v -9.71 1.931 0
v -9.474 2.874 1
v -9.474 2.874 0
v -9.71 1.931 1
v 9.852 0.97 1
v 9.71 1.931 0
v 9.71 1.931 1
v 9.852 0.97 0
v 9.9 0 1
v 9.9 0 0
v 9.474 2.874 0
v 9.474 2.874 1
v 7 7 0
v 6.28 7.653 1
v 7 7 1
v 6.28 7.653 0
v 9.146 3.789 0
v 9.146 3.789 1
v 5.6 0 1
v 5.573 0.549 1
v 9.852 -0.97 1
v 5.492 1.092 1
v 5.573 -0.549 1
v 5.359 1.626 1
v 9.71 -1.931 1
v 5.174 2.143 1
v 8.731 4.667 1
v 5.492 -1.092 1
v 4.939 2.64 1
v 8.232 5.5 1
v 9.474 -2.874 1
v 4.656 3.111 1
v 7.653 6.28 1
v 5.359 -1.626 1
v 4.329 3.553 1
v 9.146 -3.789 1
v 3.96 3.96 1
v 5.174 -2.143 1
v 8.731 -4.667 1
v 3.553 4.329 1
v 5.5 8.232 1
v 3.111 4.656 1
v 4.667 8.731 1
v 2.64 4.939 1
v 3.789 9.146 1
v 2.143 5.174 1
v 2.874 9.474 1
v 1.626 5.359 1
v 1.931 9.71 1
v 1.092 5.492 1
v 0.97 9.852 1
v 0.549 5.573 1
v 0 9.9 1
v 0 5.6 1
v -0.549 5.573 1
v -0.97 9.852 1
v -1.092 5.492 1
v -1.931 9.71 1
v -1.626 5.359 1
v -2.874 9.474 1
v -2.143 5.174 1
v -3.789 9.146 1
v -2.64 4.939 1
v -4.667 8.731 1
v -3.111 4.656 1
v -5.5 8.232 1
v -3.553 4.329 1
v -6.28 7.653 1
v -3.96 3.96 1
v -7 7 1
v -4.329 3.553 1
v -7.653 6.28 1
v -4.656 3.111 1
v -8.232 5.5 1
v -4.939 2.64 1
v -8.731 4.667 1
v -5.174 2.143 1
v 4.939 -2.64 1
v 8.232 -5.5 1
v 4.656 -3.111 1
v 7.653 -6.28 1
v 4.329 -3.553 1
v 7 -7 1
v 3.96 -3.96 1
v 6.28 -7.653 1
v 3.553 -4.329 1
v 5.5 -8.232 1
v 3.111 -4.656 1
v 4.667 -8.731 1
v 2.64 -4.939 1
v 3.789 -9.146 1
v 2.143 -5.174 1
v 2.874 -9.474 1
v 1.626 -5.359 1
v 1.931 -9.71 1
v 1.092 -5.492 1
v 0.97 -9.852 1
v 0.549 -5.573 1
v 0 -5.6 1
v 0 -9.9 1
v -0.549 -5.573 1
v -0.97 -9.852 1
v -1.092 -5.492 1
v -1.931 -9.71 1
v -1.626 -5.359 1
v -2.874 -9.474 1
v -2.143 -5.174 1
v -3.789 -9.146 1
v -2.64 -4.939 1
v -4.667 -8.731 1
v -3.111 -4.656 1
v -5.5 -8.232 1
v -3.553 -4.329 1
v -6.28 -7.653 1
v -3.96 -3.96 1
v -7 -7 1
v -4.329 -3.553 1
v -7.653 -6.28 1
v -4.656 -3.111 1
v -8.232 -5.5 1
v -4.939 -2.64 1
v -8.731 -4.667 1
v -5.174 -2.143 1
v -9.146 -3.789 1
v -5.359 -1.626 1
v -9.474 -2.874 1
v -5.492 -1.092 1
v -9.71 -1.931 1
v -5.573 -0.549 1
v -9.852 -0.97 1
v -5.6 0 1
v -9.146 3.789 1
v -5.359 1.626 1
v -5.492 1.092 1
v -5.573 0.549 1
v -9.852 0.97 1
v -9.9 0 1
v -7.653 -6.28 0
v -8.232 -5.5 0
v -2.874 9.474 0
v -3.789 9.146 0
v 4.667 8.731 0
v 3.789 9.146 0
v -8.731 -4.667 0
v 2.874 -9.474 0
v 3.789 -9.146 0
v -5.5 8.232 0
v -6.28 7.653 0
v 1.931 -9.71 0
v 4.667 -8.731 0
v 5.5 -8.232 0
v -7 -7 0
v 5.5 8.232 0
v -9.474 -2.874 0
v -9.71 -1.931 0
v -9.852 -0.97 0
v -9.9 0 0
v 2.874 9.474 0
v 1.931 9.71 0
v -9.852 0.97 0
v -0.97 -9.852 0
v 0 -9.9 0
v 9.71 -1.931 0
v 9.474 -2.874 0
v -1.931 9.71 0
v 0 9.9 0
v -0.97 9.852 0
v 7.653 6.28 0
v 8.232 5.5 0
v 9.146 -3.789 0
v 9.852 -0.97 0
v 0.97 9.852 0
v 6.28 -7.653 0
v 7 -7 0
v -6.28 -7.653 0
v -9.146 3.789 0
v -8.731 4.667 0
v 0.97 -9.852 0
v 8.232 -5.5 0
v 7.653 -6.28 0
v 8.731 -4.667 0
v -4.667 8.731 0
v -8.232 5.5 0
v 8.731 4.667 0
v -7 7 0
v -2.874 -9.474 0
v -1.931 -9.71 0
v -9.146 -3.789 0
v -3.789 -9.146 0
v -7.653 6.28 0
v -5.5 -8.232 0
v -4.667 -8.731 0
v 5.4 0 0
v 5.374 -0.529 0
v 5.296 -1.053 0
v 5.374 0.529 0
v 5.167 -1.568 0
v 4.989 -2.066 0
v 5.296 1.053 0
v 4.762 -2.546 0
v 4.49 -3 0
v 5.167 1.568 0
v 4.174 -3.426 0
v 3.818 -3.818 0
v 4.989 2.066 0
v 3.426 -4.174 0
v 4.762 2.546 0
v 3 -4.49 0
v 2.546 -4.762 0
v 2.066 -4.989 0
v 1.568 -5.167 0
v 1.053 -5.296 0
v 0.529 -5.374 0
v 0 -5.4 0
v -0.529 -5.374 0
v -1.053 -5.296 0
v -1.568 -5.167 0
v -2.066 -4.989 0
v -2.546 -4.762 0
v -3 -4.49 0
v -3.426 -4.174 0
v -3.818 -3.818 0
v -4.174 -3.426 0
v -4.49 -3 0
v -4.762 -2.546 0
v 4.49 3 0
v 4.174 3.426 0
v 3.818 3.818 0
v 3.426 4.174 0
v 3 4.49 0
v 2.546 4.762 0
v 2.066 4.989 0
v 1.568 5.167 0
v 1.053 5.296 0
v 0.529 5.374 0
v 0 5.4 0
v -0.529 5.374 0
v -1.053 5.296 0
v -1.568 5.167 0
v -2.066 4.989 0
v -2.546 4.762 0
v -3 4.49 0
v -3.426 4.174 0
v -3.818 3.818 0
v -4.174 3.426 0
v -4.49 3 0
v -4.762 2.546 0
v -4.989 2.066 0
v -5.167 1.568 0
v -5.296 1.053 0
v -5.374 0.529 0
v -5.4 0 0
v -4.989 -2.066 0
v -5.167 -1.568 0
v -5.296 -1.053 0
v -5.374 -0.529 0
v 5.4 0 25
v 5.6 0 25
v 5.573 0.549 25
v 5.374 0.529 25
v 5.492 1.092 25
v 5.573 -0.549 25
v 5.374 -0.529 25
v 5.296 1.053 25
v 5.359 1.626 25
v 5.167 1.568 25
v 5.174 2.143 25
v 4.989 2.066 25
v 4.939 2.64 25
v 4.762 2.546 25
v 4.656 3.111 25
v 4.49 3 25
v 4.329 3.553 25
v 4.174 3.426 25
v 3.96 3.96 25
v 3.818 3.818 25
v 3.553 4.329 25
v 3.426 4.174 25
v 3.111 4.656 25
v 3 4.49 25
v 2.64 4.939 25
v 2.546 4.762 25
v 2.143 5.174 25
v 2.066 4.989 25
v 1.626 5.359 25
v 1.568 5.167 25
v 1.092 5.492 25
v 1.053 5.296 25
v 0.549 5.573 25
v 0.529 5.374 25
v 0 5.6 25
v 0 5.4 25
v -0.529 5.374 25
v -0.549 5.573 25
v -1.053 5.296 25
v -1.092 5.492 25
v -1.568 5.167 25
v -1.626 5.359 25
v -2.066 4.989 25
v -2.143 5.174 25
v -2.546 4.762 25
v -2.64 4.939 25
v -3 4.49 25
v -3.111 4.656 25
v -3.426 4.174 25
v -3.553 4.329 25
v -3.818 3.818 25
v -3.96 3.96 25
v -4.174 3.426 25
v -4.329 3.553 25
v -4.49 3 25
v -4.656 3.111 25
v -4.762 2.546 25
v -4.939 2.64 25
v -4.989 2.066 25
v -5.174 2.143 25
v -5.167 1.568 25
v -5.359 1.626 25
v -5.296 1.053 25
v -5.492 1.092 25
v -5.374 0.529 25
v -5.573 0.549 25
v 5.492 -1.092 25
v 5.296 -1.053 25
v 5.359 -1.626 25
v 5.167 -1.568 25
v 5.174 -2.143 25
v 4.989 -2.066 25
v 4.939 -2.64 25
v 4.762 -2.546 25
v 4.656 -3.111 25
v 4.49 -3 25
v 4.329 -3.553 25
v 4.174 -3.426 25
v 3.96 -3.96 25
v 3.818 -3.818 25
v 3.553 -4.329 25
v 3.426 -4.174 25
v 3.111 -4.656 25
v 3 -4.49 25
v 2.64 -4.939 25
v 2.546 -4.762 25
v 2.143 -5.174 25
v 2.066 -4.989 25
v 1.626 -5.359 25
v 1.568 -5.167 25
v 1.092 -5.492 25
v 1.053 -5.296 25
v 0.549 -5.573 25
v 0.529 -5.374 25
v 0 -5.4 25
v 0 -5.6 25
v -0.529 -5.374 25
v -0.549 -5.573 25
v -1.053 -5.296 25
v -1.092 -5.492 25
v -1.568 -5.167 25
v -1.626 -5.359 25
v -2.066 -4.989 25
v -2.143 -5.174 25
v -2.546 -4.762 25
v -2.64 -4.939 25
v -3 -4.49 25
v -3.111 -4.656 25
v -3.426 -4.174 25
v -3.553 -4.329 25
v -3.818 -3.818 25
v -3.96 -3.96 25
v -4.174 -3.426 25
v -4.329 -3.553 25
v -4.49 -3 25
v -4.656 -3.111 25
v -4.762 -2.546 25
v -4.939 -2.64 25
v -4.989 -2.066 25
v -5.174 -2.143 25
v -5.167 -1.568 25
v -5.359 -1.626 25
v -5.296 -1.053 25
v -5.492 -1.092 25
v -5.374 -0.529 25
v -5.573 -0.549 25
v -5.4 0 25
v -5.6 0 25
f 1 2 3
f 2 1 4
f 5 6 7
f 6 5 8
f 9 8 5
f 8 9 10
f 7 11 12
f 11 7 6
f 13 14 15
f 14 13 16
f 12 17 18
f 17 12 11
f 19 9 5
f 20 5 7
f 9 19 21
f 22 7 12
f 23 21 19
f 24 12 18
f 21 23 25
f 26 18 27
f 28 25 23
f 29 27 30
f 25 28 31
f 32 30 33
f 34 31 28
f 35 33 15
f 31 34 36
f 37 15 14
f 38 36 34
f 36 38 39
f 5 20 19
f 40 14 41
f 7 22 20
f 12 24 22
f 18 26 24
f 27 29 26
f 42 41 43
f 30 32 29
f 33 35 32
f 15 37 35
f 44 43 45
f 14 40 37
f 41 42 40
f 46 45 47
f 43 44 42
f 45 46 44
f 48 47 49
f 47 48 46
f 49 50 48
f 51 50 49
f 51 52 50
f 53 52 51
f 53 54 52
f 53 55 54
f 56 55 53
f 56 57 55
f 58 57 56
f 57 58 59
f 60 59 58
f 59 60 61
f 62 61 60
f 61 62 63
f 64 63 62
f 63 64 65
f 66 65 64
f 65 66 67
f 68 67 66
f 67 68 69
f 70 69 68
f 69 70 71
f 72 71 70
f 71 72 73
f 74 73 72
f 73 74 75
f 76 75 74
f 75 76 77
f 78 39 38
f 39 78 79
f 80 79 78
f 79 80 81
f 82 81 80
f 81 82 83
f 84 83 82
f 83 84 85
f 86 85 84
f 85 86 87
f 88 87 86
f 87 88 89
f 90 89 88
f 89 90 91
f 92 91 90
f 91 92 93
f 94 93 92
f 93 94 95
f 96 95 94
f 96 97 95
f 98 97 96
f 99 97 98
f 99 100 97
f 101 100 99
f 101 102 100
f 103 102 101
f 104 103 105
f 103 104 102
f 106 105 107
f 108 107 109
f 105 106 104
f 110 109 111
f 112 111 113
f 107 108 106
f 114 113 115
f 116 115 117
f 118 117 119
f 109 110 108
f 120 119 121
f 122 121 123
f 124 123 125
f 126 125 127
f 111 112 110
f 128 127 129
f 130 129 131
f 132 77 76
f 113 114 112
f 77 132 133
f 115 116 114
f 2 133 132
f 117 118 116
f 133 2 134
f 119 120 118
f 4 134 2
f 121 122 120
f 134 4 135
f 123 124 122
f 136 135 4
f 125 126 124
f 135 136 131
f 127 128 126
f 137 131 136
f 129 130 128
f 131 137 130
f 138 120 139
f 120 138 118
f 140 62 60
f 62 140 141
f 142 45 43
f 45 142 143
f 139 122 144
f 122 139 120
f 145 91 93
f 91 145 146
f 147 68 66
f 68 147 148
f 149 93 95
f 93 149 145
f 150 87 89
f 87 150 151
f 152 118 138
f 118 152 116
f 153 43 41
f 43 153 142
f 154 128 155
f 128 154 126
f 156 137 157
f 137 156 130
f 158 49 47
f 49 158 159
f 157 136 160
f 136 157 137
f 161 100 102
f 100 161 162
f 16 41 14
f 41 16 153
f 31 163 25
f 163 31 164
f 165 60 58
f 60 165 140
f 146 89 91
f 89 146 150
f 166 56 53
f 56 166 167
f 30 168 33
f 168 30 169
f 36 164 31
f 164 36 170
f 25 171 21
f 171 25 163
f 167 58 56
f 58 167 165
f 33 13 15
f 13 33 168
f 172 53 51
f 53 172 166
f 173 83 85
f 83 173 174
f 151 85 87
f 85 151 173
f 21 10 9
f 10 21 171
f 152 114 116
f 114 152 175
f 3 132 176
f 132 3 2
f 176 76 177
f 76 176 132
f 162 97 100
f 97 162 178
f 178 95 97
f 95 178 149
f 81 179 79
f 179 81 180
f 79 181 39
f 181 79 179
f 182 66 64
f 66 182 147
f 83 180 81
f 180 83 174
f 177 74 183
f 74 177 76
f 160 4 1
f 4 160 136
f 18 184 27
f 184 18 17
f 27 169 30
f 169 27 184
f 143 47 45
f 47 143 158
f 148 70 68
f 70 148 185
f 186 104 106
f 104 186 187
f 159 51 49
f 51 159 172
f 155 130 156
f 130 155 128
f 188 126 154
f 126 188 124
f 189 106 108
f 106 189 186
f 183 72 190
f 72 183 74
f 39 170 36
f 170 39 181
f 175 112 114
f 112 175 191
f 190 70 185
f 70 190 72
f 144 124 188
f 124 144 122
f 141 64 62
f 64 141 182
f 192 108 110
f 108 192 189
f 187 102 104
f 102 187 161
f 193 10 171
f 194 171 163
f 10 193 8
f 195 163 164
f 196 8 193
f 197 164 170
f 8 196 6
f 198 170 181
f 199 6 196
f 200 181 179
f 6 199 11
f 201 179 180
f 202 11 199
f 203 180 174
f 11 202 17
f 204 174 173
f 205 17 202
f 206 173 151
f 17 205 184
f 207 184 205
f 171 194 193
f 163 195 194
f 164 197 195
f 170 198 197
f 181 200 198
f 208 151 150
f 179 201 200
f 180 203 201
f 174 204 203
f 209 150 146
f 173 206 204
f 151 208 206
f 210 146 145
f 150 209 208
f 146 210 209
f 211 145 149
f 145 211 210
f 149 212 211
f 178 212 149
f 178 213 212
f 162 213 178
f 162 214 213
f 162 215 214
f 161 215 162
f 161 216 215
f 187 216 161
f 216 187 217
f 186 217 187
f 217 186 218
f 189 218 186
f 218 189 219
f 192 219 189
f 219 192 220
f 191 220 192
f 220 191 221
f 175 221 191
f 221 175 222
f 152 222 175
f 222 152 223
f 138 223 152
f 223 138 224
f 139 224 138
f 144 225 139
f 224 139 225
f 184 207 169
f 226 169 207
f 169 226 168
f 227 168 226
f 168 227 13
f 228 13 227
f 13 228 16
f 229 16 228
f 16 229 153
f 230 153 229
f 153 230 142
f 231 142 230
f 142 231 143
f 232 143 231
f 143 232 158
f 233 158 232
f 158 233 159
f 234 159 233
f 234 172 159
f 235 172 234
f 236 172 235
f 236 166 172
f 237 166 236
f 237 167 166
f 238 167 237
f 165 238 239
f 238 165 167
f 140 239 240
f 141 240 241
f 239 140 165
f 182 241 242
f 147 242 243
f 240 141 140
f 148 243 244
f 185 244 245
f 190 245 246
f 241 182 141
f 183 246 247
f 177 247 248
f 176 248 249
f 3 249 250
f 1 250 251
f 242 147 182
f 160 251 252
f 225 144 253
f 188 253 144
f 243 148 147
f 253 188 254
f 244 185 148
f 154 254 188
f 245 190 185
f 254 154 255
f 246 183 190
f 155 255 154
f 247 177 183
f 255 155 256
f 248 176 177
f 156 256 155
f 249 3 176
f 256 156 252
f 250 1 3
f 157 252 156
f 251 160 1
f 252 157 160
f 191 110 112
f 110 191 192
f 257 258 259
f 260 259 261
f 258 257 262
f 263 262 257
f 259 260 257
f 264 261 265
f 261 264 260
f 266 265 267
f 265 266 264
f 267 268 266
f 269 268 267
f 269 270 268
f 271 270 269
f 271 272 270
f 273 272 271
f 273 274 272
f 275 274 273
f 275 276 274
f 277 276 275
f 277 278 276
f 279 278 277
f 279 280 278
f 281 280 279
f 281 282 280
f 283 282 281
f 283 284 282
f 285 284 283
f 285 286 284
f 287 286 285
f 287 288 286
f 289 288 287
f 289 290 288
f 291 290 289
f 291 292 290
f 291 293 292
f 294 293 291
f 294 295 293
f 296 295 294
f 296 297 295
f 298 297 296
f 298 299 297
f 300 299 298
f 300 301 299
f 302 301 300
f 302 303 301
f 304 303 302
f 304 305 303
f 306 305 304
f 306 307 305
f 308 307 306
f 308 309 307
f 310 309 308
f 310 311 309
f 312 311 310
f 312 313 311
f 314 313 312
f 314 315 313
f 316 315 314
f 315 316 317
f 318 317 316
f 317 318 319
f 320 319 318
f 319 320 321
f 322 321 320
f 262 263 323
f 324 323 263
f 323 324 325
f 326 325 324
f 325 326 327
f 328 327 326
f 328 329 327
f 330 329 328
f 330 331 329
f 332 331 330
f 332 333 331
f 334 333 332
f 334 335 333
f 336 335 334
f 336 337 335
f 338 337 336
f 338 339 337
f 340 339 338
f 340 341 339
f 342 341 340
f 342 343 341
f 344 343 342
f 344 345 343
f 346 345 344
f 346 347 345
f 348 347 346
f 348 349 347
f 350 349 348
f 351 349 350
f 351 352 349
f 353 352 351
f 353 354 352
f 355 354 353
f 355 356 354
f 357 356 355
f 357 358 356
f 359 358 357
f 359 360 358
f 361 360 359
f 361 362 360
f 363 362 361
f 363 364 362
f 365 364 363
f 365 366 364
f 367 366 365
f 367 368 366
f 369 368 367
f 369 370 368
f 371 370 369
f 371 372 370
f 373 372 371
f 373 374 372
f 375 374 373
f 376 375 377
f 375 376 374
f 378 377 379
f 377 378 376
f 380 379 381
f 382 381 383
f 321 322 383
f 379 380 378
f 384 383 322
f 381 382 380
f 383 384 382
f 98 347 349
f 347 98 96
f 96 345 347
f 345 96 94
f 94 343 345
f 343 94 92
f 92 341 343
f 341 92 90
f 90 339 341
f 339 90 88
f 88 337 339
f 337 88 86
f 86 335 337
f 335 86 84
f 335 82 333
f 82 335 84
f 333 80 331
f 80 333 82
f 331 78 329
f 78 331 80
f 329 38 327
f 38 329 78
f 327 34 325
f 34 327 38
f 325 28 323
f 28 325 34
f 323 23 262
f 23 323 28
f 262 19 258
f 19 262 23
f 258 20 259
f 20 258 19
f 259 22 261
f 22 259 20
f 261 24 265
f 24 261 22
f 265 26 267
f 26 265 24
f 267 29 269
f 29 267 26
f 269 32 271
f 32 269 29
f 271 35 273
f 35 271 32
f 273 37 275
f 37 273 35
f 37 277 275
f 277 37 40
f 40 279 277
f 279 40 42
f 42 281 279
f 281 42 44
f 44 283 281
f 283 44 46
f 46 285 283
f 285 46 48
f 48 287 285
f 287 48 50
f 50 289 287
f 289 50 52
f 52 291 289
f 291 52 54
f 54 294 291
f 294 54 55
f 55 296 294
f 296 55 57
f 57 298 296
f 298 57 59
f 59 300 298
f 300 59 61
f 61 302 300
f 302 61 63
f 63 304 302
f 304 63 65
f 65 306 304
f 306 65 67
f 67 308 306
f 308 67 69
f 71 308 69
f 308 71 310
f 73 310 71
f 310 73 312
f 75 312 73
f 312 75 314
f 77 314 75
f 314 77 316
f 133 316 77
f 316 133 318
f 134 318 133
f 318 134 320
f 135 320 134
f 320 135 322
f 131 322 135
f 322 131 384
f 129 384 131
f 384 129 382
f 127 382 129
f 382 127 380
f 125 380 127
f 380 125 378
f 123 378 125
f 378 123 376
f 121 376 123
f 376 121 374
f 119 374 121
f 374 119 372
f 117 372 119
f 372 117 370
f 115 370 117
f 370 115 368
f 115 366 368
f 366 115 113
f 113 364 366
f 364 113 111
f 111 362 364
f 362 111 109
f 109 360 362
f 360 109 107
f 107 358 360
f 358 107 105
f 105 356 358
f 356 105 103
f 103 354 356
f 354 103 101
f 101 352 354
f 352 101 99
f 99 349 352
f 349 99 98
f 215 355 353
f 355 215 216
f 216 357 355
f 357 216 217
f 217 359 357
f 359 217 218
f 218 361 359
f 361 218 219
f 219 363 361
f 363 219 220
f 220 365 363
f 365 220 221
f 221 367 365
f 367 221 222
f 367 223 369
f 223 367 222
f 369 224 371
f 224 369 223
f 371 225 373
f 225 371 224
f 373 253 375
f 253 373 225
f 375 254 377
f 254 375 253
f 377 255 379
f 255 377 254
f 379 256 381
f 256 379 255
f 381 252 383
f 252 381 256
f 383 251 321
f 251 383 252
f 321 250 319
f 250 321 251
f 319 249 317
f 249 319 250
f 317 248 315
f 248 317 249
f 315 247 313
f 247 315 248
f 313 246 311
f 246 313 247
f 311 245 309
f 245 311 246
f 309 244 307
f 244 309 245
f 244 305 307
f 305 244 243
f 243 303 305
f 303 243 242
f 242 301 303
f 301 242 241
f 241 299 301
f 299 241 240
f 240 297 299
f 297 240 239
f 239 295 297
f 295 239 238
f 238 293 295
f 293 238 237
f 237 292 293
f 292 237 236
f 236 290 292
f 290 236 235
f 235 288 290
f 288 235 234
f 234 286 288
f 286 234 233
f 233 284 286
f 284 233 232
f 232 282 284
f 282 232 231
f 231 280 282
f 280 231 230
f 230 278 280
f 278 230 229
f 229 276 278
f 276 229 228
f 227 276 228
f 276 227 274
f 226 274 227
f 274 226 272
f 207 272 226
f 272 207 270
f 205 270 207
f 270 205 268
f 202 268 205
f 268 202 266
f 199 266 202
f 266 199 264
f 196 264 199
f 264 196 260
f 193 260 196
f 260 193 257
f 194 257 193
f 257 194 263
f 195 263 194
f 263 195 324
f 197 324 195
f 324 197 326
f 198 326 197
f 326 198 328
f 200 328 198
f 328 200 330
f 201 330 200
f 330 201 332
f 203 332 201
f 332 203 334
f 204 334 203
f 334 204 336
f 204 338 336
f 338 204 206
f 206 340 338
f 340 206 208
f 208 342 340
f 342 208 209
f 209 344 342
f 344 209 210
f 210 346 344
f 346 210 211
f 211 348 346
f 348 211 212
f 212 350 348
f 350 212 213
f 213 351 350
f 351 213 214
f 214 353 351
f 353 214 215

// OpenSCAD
// file: mass-driver-parts.scad
$fn = 64;

nozzle_diameter = 0.4;

// outer diameter of the tube we're using.
tube_diameter = 10.0;

// Tolerances to add to an inner diameter so it fits over
tight_fit = 0.2;
loose_fit = 0.4;

epsilon = 0.01;

module tube(inner_diameter, outer_diameter, length){
    linear_extrude(length){
        difference(){
            circle(d = outer_diameter);
            circle(d = inner_diameter);
        }
    }
}

module loose_tube(length) {
    outer_diameter = tube_diameter + nozzle_diameter + loose_fit;
    
    tube(outer_diameter, outer_diameter + nozzle_diameter, length);
}

module base(inner_diameter, outer_diameter, thickness) {
    difference() {
        cylinder(d = outer_diameter, h = thickness);
        translate([0, 0, -epsilon])
        cylinder(d = inner_diameter, h = thickness + epsilon * 2);
    }
}
// main file
include <./mass-driver-parts.scad>

// Makes one half of a magnet coil winder.
// Print 2 for a full winder
// Use a calculator to find the length and height to use:
// https://www.accelinstruments.com/Magnetic/Magnetic-field-calculator.html
module half_coil(coil_length, coil_height) {
    coil_diameter = tube_diameter + nozzle_diameter + loose_fit;
    base_diameter = coil_diameter + coil_height;
    length = coil_length / 2;
    
    base_thickness = 2;
    base(coil_diameter, base_diameter, 1);
    loose_tube(length);
}

half_coil(50, 9);
//half_coil(30, 5.513);
//half_coil(15, 8.820);
